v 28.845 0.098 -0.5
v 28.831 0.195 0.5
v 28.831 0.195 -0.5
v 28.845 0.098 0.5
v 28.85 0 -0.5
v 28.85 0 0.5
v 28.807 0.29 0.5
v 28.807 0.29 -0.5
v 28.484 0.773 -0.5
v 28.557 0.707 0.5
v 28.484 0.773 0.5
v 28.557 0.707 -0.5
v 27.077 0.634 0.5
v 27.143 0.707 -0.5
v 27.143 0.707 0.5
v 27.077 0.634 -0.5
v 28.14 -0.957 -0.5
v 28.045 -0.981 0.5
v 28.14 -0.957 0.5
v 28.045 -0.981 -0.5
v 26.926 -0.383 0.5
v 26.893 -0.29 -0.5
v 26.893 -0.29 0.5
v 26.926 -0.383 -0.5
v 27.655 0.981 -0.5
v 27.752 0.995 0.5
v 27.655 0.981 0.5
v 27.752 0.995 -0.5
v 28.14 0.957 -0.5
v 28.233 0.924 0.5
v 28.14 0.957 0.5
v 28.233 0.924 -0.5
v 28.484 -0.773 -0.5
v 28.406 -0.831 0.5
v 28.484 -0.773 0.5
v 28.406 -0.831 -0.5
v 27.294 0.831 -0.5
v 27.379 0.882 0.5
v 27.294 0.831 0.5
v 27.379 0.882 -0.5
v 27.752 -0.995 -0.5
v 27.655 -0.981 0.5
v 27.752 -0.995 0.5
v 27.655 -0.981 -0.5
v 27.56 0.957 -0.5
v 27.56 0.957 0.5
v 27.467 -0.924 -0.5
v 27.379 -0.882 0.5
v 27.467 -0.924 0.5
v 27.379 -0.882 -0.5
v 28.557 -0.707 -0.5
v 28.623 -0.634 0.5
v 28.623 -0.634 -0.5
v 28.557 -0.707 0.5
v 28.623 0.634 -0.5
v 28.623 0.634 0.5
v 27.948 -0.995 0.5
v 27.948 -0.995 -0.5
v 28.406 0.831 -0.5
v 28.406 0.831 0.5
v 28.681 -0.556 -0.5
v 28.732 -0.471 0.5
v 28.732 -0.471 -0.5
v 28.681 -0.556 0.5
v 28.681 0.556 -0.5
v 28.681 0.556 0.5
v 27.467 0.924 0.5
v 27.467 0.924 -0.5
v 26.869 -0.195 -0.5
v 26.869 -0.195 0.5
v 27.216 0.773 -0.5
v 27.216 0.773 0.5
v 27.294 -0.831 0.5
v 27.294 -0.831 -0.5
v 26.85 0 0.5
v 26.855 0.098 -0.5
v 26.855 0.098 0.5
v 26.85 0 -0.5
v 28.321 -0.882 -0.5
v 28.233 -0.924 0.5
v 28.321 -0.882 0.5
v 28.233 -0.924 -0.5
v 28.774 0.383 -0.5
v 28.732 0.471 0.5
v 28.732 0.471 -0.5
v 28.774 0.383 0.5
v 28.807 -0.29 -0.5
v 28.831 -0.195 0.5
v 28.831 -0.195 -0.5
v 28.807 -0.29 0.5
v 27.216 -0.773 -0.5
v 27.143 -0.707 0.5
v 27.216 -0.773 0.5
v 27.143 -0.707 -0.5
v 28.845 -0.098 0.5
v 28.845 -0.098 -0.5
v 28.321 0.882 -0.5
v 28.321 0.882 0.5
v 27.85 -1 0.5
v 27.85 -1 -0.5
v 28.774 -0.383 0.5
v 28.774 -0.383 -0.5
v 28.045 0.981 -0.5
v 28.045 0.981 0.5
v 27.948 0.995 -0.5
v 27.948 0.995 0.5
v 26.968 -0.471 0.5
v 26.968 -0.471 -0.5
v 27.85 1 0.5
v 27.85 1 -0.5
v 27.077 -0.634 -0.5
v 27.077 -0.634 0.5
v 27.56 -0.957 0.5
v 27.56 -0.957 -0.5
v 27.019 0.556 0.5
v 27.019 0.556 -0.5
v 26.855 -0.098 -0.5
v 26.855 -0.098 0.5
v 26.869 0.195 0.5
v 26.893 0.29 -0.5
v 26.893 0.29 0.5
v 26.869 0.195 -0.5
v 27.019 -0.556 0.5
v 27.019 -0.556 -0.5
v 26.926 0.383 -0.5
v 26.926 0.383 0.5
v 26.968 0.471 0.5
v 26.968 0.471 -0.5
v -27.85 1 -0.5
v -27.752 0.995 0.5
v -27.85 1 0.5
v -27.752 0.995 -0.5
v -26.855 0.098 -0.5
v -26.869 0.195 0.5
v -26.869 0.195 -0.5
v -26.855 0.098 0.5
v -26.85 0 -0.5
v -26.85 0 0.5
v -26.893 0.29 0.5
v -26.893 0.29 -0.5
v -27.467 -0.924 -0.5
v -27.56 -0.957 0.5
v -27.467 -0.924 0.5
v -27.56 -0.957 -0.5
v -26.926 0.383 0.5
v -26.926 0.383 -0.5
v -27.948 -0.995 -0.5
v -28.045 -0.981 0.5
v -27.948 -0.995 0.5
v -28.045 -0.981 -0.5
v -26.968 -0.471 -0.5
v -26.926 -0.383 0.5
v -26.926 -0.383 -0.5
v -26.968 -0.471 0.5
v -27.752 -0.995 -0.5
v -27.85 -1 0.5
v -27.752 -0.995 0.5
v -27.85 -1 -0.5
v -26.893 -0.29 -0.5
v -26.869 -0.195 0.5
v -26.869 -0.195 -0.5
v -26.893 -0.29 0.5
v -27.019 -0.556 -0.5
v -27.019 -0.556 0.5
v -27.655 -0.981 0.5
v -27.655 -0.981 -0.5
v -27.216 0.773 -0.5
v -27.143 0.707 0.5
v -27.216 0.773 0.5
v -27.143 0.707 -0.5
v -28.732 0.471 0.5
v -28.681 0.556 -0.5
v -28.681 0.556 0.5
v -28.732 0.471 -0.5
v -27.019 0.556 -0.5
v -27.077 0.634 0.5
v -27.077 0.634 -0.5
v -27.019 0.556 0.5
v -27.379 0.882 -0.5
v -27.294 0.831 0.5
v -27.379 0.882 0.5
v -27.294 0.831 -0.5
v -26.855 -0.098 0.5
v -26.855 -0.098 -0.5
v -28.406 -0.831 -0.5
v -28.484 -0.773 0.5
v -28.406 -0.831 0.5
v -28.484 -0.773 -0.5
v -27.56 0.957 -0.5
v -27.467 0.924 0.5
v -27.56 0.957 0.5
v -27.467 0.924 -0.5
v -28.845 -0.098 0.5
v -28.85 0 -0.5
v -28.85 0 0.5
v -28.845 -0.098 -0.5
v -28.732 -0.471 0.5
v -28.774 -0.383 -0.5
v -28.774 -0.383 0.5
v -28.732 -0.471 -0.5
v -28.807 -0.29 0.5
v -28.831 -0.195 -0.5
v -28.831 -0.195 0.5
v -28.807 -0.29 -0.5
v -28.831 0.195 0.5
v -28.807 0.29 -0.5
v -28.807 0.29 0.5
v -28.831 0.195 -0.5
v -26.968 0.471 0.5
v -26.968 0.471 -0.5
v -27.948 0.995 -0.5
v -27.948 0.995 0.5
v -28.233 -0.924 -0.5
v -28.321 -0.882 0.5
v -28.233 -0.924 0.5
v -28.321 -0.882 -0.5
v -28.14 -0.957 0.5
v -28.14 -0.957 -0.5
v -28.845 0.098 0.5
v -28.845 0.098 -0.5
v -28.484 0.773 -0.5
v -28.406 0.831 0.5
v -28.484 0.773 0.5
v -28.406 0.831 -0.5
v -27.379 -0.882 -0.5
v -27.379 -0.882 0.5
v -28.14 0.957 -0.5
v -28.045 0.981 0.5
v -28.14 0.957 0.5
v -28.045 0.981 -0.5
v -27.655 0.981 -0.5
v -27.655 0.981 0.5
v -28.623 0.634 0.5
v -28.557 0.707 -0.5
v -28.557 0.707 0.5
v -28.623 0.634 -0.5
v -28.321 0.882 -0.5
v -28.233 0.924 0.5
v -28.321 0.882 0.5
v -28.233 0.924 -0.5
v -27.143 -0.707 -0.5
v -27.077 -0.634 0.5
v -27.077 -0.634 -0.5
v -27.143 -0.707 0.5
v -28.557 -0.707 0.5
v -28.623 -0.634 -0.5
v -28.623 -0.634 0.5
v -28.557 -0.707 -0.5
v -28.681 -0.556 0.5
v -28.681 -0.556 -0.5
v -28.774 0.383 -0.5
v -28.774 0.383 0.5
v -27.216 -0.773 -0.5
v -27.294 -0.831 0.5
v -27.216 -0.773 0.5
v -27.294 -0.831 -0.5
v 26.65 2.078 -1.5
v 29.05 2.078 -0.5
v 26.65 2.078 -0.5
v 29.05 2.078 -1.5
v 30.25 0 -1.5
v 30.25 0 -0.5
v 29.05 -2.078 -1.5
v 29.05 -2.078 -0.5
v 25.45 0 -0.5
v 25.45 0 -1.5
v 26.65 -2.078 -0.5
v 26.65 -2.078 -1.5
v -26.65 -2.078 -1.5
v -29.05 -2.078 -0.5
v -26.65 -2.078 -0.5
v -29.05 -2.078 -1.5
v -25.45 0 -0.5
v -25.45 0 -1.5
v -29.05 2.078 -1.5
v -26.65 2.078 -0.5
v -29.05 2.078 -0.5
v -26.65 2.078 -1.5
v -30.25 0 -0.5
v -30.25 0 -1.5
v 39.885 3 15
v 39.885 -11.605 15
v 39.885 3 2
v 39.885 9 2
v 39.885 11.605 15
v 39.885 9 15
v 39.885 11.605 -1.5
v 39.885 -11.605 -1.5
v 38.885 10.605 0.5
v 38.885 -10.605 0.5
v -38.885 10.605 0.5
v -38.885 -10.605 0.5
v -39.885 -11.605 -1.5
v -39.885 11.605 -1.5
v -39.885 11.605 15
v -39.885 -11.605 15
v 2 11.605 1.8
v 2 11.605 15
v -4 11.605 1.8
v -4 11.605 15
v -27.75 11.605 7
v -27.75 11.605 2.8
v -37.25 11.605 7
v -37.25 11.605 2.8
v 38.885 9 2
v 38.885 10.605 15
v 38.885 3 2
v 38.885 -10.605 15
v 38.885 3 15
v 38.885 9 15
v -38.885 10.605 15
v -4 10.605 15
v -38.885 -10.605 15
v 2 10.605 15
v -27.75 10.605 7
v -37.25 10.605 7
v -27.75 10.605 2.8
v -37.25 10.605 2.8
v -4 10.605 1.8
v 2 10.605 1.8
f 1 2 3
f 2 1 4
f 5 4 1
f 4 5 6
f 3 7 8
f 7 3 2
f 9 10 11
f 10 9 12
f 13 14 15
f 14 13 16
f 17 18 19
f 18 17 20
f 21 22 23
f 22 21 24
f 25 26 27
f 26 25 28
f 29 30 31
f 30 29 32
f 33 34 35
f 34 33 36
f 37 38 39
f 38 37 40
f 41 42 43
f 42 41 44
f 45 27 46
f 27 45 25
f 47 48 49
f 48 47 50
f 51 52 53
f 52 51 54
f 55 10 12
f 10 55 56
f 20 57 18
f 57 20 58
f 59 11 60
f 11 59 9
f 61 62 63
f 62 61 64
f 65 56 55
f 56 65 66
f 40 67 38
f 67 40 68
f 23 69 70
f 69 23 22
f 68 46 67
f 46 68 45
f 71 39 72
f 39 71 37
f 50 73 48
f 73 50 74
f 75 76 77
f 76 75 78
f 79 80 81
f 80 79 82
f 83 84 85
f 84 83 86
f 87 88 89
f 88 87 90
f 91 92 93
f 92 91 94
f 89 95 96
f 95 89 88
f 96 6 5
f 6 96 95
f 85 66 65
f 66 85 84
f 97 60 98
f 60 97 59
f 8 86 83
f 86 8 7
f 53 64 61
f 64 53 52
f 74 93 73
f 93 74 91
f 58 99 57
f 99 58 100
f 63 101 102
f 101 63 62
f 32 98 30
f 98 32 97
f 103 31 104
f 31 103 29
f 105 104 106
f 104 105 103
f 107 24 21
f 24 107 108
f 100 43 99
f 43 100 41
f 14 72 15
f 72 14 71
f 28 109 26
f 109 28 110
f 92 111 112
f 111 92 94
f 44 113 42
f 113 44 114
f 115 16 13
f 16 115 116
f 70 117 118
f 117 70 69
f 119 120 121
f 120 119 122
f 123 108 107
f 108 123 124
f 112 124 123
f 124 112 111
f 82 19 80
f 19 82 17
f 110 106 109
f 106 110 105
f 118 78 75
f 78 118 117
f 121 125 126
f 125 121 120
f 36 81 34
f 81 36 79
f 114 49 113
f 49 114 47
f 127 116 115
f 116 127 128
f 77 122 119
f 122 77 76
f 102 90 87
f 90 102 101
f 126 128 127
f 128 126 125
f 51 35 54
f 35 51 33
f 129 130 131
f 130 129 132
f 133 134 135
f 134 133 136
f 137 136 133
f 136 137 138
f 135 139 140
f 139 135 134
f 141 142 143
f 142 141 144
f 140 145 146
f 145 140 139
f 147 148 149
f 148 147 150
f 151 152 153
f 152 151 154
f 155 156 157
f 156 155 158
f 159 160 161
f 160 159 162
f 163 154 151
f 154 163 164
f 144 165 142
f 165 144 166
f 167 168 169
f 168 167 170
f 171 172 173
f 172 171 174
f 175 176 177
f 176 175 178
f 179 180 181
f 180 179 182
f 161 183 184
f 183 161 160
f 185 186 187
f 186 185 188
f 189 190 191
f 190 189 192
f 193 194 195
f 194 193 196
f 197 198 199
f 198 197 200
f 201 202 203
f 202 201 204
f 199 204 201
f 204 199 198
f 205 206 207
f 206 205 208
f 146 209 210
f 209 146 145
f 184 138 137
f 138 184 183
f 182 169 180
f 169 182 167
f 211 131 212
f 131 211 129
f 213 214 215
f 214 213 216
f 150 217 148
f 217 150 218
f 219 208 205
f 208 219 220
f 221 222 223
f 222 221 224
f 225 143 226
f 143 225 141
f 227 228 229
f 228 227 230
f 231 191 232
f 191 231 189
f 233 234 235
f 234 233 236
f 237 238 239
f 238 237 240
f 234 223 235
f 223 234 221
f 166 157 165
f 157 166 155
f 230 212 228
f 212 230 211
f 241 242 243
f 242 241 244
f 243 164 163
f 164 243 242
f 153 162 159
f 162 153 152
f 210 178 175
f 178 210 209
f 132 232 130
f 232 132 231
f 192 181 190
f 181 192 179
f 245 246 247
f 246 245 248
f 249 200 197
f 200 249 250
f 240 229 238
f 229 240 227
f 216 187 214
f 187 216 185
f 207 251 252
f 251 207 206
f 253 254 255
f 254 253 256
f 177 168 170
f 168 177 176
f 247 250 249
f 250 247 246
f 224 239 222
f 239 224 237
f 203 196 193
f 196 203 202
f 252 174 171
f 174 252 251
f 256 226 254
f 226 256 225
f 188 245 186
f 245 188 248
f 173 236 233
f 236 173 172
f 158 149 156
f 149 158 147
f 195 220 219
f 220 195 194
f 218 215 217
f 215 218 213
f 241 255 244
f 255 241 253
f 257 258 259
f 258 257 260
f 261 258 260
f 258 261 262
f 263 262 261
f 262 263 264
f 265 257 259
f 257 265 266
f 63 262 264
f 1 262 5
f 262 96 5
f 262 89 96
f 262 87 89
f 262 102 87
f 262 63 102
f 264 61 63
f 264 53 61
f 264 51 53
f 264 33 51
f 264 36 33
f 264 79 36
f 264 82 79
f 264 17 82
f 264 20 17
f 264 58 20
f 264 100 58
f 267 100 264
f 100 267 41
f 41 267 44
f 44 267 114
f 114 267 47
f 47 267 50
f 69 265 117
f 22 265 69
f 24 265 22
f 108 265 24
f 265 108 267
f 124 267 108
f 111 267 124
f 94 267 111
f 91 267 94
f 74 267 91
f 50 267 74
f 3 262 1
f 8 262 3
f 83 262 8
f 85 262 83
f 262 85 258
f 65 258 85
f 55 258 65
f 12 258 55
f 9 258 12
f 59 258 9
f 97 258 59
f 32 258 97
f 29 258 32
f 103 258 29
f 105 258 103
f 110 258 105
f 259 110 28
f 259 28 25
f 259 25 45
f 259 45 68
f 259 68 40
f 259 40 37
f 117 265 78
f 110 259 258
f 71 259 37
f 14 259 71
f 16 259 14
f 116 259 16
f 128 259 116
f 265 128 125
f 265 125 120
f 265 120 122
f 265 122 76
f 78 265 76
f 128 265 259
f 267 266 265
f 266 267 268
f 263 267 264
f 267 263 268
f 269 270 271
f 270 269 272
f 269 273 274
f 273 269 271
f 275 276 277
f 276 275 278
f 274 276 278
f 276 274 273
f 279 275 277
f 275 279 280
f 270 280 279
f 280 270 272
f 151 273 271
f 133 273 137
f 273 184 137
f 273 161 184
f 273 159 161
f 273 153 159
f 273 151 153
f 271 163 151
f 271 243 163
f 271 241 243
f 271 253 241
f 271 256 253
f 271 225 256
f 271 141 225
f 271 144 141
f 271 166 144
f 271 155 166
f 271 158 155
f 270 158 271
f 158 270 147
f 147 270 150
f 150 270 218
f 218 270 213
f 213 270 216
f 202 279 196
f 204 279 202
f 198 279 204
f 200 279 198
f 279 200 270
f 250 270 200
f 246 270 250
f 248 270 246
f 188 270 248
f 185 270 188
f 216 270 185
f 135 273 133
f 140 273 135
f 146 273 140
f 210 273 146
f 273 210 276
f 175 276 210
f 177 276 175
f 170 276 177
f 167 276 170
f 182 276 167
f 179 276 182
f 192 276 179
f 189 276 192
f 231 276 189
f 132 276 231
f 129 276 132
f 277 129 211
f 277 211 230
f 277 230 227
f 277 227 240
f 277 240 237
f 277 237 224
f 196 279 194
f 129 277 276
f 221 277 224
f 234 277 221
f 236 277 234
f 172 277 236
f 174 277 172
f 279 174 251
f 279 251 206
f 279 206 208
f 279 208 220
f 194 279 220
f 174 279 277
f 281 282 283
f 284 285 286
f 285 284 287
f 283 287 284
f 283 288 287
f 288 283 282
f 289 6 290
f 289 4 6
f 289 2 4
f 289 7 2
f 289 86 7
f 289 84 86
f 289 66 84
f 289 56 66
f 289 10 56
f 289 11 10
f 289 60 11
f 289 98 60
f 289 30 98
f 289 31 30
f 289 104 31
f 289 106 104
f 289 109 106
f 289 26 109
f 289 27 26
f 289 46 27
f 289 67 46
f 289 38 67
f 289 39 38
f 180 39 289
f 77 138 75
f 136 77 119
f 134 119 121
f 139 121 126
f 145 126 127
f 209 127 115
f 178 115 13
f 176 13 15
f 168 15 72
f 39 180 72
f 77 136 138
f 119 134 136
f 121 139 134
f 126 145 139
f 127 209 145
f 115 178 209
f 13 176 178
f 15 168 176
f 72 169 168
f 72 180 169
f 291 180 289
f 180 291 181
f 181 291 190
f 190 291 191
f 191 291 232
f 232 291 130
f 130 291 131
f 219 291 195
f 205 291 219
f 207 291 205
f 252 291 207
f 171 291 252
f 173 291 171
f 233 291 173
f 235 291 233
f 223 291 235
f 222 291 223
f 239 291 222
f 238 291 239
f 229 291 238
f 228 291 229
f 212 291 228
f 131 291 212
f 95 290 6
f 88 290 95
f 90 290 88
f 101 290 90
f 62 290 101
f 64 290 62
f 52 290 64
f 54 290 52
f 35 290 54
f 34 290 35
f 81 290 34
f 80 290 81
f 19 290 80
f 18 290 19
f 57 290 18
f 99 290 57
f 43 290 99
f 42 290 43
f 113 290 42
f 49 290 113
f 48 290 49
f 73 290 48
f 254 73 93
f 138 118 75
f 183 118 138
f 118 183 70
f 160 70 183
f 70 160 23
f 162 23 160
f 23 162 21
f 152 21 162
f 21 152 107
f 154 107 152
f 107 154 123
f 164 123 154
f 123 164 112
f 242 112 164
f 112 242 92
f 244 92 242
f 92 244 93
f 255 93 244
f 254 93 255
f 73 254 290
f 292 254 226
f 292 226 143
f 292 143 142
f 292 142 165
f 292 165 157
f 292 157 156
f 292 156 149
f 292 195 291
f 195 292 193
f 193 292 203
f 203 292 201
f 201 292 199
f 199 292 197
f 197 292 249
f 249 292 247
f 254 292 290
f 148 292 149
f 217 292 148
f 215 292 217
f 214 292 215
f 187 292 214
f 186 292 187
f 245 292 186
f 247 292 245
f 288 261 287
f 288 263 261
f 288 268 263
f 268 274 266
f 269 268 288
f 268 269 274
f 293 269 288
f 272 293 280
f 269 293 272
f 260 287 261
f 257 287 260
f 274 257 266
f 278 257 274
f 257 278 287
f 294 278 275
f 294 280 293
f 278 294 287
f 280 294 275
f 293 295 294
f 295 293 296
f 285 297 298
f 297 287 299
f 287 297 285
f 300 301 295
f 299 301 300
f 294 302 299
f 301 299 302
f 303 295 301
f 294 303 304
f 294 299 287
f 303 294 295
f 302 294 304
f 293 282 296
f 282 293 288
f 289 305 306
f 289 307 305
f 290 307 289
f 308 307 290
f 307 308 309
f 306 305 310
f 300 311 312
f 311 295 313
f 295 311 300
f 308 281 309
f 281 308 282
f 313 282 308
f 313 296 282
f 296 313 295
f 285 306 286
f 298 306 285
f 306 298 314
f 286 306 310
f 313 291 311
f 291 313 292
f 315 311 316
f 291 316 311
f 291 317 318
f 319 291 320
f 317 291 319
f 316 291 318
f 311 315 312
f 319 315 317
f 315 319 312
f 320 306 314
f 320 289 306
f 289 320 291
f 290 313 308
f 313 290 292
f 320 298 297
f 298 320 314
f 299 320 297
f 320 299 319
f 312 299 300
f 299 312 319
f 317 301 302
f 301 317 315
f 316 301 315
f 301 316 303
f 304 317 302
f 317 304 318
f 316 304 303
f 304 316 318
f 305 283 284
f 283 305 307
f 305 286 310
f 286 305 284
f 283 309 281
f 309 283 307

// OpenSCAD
$fn=64;

length = 77 * 1.01;
width = 21 * 1.01;
height = 15;
thick = 1;

// Base
difference() {
  translate([0, 0, -thick/2])
    cube([length+(thick*2), width+(thick*2), 2], center=true);
  union() {
    // Screw holes
    translate([55.7/2, 0, -2])
      cylinder(h=3, d=2);
    translate([-55.7/2, 0, -2])
      cylinder(h=3, d=2);
    // Nut countersink
    translate([55.7/2, 0, -2.5])
      cylinder(h=2, d=4.8, $fn=6);
    translate([-55.7/2, 0, -2.5])
      cylinder(h=2, d=4.8, $fn=6);
  }
}

// Lip
difference() {
  translate([0, 0, height/2])
    cube([length+(thick*2), width+(thick*2), height], center=true);
  union() {
    translate([0, 0, height/2])
      cube([length, width, height], center=true);
    // Power switch.
    translate([-1, 11.5, 8.6])
      cube([6, thick+1, 13.6], center=true);
    // USB-C.
    translate([-32.5, 11.5, 4.9])
      cube([9.5, thick+1, 4.2], center=true);
    // Output.
    translate([39.5, 6, 9])
      cube([thick+1, 6, 14], center=true);
  }
}
